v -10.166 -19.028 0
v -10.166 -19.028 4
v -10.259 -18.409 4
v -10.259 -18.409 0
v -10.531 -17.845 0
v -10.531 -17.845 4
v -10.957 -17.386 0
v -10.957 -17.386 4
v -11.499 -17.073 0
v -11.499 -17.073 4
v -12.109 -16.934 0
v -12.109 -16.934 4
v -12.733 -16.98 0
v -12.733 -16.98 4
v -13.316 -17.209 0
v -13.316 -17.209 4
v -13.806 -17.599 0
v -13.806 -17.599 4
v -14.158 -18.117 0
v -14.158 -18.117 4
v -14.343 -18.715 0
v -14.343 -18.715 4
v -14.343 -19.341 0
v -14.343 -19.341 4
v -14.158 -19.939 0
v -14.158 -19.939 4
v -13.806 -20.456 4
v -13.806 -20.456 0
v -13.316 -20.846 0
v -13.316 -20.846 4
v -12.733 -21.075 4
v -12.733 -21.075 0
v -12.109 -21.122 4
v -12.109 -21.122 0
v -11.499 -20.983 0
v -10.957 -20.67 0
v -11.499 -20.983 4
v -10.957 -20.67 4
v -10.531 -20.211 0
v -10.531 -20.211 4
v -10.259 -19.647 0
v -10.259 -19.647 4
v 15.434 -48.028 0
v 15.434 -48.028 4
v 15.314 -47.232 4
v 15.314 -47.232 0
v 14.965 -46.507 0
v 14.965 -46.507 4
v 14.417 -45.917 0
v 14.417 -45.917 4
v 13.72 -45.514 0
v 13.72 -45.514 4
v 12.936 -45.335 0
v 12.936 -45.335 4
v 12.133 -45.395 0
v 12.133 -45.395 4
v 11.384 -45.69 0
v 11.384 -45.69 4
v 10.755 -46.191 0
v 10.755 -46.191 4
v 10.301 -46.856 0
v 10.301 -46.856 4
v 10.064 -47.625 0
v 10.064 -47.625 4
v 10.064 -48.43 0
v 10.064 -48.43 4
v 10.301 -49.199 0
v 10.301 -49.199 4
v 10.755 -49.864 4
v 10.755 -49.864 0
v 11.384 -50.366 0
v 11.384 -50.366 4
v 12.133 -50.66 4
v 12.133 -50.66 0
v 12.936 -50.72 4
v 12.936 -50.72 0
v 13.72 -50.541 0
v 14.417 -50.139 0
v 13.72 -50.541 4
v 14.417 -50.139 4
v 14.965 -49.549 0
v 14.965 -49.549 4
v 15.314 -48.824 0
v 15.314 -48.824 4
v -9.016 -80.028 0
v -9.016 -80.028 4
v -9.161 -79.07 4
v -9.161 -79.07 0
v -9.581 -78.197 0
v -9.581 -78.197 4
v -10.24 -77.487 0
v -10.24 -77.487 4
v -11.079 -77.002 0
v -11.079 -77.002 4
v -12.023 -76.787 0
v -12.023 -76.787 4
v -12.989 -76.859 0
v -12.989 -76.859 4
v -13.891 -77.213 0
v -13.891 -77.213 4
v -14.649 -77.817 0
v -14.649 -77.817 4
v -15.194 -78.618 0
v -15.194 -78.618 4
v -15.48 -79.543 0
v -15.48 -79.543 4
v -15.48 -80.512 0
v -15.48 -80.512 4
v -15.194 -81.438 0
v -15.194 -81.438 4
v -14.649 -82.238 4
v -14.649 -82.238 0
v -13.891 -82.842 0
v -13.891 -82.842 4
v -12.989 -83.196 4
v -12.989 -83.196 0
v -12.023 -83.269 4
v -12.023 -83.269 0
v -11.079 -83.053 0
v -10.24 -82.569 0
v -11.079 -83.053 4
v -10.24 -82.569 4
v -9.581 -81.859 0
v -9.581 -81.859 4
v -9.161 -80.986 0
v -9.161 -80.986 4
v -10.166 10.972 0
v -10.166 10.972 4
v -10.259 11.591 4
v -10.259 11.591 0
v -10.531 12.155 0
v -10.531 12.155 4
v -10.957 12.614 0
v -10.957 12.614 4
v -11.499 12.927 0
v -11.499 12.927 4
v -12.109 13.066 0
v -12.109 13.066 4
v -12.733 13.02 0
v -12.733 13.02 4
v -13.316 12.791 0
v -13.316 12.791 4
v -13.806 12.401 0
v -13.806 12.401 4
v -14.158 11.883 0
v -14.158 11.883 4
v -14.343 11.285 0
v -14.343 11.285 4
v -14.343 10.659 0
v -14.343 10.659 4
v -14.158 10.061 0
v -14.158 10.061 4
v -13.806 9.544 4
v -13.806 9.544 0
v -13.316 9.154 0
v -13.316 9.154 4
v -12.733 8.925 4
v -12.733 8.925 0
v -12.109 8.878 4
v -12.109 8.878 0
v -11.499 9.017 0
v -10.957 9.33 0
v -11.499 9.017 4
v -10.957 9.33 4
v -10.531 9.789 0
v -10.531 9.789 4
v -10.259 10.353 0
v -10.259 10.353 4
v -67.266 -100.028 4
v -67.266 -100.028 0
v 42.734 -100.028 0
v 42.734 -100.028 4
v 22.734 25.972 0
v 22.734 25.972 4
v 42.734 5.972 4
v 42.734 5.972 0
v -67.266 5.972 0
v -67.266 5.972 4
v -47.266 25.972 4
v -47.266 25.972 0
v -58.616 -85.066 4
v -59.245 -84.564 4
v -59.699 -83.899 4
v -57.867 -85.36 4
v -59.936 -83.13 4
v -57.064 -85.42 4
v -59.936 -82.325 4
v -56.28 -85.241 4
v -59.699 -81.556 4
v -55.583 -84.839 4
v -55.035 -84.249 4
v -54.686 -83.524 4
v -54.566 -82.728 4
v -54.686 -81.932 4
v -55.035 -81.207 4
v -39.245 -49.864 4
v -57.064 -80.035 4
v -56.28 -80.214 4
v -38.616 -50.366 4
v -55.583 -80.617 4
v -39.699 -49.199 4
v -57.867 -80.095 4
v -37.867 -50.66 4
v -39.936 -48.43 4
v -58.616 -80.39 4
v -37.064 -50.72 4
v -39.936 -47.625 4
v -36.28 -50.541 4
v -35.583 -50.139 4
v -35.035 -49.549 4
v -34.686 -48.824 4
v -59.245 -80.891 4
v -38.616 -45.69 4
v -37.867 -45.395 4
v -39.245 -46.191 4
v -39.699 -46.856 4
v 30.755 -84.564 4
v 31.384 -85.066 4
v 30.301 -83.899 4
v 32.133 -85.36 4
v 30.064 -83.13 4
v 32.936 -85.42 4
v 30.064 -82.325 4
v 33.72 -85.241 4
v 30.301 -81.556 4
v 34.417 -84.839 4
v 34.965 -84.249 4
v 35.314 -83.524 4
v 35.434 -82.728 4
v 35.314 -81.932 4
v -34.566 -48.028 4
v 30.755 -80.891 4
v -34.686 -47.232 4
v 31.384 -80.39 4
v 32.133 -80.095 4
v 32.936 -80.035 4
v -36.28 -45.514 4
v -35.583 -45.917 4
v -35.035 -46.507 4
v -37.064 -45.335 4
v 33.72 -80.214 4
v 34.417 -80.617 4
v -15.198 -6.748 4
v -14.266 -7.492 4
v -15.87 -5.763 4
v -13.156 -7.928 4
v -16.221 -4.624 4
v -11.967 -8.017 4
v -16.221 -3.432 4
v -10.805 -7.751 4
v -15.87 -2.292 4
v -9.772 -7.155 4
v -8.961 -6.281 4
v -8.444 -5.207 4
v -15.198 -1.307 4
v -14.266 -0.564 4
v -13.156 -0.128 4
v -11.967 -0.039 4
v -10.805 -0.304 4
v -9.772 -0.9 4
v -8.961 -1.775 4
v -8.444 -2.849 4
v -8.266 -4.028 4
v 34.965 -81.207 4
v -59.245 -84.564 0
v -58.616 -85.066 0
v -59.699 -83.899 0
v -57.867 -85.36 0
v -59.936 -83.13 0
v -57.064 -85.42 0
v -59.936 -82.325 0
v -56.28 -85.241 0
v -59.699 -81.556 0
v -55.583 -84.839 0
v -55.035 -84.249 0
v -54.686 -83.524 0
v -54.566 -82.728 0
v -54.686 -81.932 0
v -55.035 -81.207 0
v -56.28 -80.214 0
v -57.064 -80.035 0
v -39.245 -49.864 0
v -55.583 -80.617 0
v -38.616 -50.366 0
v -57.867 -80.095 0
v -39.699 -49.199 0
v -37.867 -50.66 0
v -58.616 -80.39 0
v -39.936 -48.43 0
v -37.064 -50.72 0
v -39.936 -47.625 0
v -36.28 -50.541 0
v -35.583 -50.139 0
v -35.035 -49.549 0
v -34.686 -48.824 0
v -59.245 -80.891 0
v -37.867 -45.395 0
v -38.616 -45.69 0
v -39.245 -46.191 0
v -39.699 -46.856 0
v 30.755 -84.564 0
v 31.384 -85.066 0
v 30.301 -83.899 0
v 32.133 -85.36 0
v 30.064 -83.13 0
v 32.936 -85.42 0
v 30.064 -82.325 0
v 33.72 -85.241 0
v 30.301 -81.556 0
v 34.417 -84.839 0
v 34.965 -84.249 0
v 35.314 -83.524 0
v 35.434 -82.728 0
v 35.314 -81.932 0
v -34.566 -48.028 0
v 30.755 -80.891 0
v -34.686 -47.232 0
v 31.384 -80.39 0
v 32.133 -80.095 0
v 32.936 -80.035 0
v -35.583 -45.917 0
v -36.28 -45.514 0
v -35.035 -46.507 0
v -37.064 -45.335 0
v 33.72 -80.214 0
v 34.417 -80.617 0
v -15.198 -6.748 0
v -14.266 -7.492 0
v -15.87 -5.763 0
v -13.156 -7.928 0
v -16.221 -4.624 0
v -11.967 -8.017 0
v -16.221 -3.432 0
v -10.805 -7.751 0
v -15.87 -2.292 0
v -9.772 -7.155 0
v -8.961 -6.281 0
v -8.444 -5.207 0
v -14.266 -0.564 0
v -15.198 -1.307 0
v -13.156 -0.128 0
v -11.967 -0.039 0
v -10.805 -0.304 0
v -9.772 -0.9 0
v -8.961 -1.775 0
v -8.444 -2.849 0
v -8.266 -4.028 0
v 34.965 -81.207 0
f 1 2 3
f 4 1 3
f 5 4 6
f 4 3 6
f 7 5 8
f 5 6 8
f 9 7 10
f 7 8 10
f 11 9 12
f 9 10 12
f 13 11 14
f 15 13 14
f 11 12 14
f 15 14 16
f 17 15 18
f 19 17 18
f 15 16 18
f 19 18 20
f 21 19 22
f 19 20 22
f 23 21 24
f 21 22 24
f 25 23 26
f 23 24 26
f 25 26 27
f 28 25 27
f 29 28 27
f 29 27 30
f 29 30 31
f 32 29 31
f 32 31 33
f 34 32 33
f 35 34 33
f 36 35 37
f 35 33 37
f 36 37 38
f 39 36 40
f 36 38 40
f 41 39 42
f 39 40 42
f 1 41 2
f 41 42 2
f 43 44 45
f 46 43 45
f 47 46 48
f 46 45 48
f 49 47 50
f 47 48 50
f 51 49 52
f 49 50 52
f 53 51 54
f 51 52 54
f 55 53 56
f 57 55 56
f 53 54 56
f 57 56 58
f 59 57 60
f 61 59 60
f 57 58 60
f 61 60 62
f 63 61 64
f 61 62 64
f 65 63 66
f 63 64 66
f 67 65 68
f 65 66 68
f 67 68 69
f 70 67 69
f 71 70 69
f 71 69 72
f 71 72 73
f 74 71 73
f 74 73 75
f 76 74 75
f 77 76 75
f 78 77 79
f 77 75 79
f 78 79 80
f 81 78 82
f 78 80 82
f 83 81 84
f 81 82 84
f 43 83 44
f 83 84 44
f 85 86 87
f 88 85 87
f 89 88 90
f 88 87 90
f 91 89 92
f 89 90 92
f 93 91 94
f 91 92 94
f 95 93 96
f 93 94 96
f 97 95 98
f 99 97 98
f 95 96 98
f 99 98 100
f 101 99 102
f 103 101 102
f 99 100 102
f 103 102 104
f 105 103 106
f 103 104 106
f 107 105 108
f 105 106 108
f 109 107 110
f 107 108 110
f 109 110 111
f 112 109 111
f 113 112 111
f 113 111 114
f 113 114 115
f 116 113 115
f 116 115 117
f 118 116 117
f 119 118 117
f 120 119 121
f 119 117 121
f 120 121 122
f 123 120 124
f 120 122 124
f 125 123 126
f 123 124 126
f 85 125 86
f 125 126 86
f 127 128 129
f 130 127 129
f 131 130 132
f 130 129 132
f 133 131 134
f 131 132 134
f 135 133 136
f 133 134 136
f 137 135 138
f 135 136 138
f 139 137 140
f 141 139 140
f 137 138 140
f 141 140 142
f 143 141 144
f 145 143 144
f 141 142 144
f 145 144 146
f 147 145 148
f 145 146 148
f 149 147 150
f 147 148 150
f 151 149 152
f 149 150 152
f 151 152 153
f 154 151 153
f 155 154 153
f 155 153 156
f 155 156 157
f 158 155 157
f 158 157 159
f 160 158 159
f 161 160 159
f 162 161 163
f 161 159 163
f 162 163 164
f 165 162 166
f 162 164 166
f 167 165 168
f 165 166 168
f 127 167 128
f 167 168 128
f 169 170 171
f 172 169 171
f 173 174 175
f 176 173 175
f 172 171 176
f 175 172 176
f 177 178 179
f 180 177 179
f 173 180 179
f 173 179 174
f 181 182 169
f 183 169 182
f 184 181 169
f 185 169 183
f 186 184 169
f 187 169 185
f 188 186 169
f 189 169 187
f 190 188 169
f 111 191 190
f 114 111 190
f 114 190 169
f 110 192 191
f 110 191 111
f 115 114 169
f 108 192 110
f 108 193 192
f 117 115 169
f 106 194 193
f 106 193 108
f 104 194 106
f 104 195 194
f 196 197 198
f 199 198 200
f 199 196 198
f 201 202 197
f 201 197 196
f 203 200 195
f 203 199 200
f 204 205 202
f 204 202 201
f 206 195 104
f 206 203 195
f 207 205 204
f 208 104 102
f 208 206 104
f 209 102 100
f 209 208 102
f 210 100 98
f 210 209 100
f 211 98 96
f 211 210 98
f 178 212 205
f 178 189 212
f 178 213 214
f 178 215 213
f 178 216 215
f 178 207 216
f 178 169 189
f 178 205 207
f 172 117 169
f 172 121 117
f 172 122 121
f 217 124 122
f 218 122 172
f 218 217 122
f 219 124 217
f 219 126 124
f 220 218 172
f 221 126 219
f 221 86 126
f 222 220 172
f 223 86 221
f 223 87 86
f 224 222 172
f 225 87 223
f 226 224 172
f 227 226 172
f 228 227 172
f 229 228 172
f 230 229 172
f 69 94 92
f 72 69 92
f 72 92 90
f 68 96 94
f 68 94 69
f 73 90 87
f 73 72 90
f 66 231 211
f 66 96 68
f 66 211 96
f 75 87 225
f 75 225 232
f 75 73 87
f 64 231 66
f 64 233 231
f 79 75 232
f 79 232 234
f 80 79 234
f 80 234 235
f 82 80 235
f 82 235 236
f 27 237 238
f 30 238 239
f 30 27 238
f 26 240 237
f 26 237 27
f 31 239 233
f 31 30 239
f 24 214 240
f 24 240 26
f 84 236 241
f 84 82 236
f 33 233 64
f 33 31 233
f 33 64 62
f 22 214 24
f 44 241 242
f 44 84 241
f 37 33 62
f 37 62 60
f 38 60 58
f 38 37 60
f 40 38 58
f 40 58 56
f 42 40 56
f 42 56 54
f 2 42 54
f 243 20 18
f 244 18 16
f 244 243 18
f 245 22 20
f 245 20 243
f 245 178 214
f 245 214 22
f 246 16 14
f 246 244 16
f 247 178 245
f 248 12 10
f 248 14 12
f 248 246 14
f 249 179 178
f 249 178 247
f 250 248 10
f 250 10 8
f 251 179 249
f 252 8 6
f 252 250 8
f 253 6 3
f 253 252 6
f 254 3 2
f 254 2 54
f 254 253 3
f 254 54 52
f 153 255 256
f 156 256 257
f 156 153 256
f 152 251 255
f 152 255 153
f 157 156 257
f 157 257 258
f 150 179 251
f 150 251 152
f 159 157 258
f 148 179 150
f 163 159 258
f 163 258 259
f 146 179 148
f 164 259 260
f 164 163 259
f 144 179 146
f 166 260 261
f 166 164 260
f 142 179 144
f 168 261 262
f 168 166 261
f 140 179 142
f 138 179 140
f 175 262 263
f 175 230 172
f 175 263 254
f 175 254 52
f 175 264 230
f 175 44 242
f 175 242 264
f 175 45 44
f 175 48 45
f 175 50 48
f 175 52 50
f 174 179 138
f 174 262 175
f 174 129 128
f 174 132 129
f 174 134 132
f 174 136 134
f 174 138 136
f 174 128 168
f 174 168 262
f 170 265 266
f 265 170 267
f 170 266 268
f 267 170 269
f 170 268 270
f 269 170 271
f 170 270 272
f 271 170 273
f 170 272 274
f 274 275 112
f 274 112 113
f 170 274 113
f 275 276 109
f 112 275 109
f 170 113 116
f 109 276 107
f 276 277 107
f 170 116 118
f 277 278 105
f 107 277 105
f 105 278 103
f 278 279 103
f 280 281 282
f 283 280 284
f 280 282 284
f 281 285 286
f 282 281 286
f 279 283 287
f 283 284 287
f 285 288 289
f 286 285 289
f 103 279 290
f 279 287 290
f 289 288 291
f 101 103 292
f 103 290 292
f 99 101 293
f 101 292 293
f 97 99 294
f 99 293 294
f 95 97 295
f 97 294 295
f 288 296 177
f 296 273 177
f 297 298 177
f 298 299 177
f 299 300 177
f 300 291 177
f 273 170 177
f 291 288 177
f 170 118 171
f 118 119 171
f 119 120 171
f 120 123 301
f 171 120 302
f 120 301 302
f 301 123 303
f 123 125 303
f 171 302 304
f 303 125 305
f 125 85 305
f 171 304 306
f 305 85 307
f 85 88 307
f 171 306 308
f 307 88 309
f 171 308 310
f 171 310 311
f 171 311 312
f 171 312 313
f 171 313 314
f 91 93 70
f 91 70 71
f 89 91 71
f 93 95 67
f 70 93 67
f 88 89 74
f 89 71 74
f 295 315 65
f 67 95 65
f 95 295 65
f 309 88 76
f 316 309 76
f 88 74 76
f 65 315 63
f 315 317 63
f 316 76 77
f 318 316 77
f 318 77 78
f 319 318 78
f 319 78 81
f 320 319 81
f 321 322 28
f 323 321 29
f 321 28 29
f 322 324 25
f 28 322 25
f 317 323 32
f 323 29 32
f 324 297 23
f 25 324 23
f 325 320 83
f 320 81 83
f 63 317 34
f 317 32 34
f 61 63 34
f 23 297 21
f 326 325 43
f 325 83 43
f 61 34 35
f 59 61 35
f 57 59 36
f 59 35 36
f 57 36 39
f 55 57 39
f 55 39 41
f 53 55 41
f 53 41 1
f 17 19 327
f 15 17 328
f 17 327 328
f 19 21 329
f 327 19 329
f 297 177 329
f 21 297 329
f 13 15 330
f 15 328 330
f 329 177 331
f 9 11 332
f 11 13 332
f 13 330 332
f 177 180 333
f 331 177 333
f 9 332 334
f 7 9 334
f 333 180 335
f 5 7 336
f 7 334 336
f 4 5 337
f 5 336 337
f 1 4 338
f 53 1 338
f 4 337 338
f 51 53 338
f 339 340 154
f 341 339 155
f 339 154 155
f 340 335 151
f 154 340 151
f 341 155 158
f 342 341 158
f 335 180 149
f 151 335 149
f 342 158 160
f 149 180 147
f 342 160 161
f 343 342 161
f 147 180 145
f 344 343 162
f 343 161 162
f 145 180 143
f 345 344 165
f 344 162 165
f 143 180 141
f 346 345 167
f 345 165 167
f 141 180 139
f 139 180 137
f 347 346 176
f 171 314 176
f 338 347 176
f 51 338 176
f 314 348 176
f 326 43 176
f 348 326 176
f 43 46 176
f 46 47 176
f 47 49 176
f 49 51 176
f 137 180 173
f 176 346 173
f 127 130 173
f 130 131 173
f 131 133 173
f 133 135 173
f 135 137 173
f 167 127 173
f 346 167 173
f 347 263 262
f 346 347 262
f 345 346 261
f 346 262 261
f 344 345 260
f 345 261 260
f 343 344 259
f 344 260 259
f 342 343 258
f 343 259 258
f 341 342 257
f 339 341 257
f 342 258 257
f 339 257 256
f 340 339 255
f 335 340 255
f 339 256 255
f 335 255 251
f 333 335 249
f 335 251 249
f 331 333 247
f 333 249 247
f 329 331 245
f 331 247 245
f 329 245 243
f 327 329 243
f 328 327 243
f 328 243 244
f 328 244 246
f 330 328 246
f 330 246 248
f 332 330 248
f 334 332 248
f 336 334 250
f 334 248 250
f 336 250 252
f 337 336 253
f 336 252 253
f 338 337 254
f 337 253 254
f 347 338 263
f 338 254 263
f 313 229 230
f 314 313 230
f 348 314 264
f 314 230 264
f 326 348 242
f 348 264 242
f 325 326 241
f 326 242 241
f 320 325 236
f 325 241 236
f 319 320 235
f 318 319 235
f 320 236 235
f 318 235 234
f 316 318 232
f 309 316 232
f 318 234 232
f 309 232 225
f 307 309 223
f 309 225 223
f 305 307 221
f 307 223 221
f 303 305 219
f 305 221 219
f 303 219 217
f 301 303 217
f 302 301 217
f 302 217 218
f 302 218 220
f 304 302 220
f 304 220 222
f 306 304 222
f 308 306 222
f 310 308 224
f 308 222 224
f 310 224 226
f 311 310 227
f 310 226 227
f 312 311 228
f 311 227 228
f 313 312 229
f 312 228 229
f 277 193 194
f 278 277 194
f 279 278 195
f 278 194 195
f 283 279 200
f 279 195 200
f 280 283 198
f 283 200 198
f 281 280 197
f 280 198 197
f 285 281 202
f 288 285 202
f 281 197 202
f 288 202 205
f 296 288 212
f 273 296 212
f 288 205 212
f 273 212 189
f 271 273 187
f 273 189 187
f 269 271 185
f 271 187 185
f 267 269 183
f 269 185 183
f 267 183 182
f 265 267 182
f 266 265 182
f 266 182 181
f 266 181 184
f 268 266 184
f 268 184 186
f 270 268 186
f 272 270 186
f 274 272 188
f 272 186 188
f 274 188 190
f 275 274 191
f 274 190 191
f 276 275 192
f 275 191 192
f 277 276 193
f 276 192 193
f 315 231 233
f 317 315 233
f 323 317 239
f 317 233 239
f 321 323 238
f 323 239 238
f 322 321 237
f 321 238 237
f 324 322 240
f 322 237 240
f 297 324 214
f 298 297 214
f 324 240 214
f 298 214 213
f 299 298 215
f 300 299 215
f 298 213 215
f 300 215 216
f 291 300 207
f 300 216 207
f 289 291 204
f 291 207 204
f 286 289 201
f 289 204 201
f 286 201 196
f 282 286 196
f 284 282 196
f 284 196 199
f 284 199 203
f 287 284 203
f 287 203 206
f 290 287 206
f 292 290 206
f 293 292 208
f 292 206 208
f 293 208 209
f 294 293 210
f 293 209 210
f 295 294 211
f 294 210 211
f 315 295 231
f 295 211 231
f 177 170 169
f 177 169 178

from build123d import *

# Parameters (mm, degrees)
SKETCH_1_W          = 110
SKETCH_1_H          = 126
EXTRUDE_1_DEPTH     = 4
SKETCH_2_R          = 2.7
SKETCH_2_R_2        = 3.25
SKETCH_2_R_3        = 4
SKETCH_2_R_4        = 2.1
CUT_EXTRUDE_2_DEPTH = 4
CUT_EXTRUDE_3_DEPTH = 4


with BuildPart() as part:
    # 草图1 → 凸台-拉伸1 (new body)
    with BuildSketch(Plane.XY):
        with Locations((-12.266115935, -37.027805236)):
            Rectangle(SKETCH_1_W, SKETCH_1_H)
    extrude(amount=EXTRUDE_1_DEPTH)

    # 草图2 → 切除-拉伸2 (cut)
    with BuildSketch(Plane.XY.offset(4)):
        with Locations((12.733884065, -48.027805236)):
            Circle(SKETCH_2_R)
        with Locations((32.733884065, -82.727805236)):
            Circle(SKETCH_2_R)
        with Locations((-37.266115935, -48.027805236)):
            Circle(SKETCH_2_R)
        with Locations((-57.266115935, -82.727805236)):
            Circle(SKETCH_2_R)
        with Locations((-12.266115935, -80.027805236)):
            Circle(SKETCH_2_R_2)
        with Locations((-12.266115935, -4.027805236)):
            Circle(SKETCH_2_R_3)
        with Locations((-12.266115935, 10.972194764)):
            Circle(SKETCH_2_R_4)
        with Locations((-12.266115935, -19.027805236)):
            Circle(SKETCH_2_R_4)
    extrude(amount=-CUT_EXTRUDE_2_DEPTH, mode=Mode.SUBTRACT)

    # 草图3 → 切除-拉伸3 (cut)
    with BuildSketch(Plane.XY.offset(4)):
        Polygon((-67.266115935, 5.972194764), (-47.266115935, 25.972194764), (-67.266115935, 25.972194764), align=None)
        Polygon((22.733884065, 25.972194764), (42.733884065, 5.972194764), (42.733884065, 25.972194764), align=None)
    extrude(amount=-CUT_EXTRUDE_3_DEPTH, mode=Mode.SUBTRACT)


solid = part.part
